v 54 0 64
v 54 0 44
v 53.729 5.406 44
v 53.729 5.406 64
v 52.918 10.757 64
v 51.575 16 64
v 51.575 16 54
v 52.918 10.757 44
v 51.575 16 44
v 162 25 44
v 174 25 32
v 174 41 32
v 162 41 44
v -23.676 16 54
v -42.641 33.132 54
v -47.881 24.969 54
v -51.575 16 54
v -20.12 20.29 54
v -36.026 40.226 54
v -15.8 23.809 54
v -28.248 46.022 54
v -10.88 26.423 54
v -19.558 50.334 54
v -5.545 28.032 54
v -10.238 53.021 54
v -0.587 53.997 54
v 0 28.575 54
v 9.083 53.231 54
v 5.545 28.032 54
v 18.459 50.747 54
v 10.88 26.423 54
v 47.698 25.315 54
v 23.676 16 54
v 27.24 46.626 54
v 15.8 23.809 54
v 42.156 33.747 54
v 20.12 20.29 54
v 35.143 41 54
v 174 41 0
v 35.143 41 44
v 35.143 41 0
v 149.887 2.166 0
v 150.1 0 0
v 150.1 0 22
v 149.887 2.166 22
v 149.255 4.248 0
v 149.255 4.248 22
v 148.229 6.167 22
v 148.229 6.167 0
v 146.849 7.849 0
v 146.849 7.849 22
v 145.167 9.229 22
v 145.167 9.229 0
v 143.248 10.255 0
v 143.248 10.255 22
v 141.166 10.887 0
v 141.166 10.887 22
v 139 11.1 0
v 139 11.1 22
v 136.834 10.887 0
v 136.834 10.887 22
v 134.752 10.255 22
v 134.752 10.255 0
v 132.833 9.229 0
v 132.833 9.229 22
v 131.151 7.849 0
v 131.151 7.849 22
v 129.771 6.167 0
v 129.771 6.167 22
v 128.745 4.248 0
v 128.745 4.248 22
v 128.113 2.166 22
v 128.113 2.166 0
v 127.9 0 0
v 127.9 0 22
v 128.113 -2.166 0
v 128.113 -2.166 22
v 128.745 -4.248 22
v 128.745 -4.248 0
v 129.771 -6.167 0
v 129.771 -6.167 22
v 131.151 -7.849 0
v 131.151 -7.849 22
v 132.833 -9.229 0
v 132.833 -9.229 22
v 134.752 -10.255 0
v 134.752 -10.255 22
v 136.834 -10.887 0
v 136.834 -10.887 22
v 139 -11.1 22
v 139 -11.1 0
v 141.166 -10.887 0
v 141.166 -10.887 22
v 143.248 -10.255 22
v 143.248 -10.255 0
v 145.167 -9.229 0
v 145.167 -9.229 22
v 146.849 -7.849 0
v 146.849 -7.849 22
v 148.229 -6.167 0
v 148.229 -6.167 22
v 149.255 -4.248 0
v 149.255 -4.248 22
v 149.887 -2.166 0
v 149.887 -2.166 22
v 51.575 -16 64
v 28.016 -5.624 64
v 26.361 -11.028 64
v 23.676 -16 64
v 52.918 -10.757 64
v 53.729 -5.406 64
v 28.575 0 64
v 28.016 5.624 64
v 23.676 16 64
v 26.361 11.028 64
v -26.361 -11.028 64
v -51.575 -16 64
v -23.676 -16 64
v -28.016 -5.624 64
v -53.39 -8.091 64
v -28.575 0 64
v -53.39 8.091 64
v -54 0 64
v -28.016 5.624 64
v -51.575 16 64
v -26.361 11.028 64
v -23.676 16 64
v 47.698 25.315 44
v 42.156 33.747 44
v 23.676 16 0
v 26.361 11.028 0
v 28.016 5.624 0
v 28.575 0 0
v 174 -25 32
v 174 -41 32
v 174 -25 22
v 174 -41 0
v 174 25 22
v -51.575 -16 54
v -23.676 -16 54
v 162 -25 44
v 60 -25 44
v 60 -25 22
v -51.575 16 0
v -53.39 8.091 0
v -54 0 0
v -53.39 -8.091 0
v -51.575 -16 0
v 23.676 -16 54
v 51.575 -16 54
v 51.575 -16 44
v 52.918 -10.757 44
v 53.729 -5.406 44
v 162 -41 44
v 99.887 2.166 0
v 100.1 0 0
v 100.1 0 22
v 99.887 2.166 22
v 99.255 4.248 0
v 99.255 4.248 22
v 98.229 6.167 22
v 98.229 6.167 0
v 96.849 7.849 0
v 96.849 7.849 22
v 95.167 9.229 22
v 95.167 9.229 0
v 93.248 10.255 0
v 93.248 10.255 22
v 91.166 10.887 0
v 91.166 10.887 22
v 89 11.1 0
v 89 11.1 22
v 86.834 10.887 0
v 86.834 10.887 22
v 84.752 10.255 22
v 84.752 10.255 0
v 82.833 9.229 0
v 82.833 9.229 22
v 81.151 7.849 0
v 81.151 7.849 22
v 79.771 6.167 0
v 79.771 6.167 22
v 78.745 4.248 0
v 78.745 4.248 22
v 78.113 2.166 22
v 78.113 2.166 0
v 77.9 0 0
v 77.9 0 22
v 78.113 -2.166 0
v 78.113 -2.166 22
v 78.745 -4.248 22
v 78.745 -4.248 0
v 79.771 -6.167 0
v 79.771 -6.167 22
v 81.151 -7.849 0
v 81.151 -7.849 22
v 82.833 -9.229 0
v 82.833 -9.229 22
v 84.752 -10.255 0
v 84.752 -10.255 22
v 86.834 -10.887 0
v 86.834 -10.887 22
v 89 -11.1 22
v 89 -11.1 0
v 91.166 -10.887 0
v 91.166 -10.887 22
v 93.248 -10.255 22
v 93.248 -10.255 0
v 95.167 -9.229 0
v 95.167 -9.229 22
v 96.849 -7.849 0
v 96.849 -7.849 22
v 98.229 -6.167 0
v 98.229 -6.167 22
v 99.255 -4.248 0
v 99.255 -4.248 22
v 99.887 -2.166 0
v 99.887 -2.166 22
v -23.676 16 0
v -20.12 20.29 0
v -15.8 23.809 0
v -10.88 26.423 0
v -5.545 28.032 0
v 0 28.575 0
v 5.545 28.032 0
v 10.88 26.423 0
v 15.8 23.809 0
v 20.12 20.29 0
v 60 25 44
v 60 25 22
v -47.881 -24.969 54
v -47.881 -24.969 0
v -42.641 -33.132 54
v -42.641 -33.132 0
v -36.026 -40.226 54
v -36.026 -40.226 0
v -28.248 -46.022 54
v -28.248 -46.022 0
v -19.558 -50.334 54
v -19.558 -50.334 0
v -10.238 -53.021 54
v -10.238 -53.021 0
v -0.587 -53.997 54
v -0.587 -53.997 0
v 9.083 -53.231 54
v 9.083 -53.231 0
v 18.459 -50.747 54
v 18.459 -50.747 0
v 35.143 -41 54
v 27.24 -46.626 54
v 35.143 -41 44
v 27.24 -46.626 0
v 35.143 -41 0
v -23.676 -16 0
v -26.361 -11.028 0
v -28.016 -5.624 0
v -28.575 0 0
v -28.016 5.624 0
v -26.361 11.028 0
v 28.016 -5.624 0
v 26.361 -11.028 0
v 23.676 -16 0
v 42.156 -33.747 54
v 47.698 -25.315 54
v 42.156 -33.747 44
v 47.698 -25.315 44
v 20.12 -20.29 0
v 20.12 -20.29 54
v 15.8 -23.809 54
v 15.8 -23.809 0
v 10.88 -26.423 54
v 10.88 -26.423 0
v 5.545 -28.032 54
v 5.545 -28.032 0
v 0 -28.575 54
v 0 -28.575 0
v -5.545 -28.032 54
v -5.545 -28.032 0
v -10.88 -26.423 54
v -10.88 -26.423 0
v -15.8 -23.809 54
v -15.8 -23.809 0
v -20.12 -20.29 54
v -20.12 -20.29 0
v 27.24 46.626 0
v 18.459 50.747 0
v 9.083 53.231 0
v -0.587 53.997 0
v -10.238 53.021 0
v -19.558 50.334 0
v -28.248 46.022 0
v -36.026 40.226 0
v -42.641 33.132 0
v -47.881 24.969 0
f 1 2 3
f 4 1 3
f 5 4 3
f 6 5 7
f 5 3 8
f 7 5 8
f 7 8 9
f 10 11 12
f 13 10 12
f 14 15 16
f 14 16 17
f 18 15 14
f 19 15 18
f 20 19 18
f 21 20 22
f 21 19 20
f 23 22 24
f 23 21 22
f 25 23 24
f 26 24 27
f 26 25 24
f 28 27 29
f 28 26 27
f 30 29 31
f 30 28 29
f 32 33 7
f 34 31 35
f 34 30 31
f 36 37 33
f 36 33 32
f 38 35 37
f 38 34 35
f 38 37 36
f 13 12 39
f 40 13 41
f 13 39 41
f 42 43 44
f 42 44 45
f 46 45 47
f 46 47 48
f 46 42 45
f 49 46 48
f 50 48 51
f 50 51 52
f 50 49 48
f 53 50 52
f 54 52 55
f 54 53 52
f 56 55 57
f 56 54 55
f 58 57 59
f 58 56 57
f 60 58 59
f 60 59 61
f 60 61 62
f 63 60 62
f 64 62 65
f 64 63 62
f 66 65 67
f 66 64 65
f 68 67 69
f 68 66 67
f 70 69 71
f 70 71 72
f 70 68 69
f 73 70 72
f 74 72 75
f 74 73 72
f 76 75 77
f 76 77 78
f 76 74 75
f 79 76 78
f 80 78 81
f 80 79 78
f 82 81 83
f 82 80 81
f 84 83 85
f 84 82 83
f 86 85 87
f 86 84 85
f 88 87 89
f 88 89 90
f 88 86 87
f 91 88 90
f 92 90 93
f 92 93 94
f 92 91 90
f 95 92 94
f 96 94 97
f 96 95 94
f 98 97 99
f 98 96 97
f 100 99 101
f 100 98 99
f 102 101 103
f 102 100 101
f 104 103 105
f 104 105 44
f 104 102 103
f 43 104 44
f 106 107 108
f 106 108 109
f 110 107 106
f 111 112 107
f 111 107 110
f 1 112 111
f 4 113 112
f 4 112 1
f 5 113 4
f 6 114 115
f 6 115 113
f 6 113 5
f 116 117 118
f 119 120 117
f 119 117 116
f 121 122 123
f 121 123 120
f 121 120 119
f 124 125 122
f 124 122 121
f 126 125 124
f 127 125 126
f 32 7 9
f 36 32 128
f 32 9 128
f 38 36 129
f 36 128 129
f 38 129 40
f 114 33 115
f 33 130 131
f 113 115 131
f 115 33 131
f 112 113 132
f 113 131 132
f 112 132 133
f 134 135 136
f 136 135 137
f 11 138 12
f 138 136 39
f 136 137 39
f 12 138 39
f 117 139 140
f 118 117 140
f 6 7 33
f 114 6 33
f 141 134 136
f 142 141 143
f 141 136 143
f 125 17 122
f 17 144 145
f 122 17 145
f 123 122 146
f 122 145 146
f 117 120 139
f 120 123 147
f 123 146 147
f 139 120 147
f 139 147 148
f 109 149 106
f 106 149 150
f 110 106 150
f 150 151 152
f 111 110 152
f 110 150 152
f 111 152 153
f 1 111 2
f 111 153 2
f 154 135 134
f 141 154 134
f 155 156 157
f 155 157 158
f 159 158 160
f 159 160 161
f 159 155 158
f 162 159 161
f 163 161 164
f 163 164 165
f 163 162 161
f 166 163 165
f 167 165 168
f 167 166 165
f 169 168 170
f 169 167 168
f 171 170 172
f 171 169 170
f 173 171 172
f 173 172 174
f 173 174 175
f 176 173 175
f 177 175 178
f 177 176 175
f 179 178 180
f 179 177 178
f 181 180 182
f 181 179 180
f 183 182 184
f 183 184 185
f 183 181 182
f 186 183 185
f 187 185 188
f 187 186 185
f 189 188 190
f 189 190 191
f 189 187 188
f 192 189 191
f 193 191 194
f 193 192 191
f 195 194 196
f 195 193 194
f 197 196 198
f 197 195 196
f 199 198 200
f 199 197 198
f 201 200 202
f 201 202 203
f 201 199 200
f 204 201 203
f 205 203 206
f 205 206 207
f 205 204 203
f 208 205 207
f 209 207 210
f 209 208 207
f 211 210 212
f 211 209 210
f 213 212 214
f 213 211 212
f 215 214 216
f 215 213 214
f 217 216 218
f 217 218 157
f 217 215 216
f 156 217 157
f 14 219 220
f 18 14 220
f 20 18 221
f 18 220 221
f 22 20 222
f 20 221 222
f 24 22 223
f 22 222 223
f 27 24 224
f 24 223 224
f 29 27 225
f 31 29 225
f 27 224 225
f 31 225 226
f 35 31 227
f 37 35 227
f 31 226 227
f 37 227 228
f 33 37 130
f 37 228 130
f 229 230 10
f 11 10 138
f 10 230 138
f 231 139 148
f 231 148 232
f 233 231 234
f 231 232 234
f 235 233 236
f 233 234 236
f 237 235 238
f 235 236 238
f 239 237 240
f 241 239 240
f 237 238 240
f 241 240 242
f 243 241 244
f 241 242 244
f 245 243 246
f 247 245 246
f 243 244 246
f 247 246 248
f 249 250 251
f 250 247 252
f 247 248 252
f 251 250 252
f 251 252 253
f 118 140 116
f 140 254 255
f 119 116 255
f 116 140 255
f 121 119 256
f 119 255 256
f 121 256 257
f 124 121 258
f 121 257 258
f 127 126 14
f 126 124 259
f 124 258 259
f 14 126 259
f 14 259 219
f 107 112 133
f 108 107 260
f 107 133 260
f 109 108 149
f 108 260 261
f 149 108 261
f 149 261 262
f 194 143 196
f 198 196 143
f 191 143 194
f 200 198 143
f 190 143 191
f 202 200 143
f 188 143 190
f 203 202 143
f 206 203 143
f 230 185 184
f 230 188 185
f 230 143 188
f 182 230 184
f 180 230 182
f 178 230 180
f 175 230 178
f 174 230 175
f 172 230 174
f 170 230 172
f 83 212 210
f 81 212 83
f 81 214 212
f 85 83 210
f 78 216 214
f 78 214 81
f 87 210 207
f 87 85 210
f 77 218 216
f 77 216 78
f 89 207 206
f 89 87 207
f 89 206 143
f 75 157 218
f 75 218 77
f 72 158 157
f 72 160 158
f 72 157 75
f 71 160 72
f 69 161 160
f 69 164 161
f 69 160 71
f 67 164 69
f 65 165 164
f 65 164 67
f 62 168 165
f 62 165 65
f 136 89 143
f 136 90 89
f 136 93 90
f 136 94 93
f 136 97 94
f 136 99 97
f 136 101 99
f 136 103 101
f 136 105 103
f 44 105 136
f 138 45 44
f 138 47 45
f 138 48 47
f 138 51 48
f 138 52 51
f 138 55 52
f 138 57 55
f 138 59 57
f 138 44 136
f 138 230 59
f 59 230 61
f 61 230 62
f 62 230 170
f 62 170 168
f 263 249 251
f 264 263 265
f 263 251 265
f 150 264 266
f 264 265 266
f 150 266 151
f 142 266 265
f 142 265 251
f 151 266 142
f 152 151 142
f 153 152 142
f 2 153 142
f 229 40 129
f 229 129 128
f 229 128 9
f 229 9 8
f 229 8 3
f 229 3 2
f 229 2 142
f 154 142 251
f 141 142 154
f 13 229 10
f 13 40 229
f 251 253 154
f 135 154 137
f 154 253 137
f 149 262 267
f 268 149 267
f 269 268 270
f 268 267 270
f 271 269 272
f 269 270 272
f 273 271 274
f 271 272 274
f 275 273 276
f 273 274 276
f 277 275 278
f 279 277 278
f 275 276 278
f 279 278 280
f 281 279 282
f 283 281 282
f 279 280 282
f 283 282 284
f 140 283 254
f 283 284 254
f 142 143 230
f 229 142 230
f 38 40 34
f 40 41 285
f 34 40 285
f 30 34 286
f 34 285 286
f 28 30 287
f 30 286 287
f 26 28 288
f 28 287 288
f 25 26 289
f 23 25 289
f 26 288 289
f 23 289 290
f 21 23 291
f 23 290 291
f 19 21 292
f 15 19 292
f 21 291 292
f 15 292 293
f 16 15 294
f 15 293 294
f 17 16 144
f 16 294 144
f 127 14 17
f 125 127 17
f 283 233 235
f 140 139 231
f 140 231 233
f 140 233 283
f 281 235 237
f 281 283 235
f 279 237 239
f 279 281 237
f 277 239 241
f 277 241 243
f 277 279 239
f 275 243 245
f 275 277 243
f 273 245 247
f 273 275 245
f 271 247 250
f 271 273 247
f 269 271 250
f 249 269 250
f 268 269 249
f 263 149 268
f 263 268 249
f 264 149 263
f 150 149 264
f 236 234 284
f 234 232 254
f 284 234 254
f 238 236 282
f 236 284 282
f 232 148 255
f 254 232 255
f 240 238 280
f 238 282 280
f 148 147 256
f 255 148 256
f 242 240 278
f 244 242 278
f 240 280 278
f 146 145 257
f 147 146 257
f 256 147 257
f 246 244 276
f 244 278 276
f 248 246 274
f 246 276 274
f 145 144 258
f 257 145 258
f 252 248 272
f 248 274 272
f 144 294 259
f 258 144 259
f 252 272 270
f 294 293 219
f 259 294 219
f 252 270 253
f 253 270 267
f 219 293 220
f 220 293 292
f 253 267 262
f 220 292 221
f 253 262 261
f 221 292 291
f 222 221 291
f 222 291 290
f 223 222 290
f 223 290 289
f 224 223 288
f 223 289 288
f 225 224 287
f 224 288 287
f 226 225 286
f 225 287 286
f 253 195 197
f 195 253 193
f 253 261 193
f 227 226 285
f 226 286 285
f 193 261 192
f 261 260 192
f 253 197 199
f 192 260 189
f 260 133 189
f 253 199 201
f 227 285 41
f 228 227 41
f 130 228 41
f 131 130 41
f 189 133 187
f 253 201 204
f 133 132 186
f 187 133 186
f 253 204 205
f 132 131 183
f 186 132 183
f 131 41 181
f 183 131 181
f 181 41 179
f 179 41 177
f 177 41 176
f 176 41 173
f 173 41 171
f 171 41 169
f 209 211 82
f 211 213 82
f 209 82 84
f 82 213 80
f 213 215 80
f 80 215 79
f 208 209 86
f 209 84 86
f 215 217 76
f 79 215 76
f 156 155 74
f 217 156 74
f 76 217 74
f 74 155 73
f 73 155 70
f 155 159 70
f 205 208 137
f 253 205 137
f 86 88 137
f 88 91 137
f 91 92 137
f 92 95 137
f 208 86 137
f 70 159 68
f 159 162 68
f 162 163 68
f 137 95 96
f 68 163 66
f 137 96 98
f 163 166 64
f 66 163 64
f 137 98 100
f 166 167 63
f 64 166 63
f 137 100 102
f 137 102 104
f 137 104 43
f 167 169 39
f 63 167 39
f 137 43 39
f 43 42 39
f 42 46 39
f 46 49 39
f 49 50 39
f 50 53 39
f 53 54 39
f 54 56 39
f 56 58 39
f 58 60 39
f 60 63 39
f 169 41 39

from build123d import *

# Parameters (mm, degrees)
F1_DEPTH = 54
F2_DEPTH = 64
F3_DEPTH = 44
F0_W     = 114
F0_H     = 50
F0_R     = 11.1
F4_DEPTH = 22
F5_SIZE2 = 12
F5_SIZE  = 12


with BuildPart() as f1:
    # F0 (on Top) → F1 (new body)
    with BuildSketch(Plane.XY):
        with BuildLine():
            Line((23.675528, 16), (51.575188, 16))
            ThreePointArc((51.575188, 16), (45.124741, 29.660711), (35.142567, 41))
            ThreePointArc((35.142567, 41), (-14.958535, 51.886821), (-51.575188, 16))
            Line((-51.575188, 16), (-23.675528, 16))
            ThreePointArc((-23.675528, 16), (0, 28.575), (23.675528, 16))
        make_face()
        with BuildLine():
            ThreePointArc((35.142567, -41), (45.124741, -29.660711), (51.575188, -16))
            Line((51.575188, -16), (23.675528, -16))
            ThreePointArc((23.675528, -16), (0, -28.575), (-23.675528, -16))
            Line((-23.675528, -16), (-51.575188, -16))
            ThreePointArc((-51.575188, -16), (-14.958535, -51.886821), (35.142567, -41))
        make_face()
    extrude(amount=F1_DEPTH)



with BuildPart() as f2:
    # F0 (on Top) → F2 (new body)
    with BuildSketch(Plane.XY):
        with BuildLine():
            Line((-23.675528, 16), (-51.575188, 16))
            ThreePointArc((-51.575188, 16), (-54, 0), (-51.575188, -16))
            Line((-51.575188, -16), (-23.675528, -16))
            ThreePointArc((-23.675528, -16), (-28.575, 0), (-23.675528, 16))
        make_face()
        with BuildLine():
            ThreePointArc((51.575188, -16), (53.390356, -8.091349), (54, 0))
            ThreePointArc((54, 0), (53.390356, 8.091349), (51.575188, 16))
            Line((51.575188, 16), (23.675528, 16))
            ThreePointArc((23.675528, 16), (27.322691, 8.366672), (28.575, 0))
            ThreePointArc((28.575, 0), (27.322691, -8.366672), (23.675528, -16))
            Line((23.675528, -16), (51.575188, -16))
        make_face()
    extrude(amount=F2_DEPTH)


with BuildPart() as f1_1:
    add(f1.part)

    add(f2.part)  # F3 merges F2
    # F0 (on Top) → F3 (join)
    with BuildSketch(Plane.XY):
        with BuildLine():
            ThreePointArc((51.575188, 16), (53.390356, 8.091349), (54, 0))
            ThreePointArc((54, 0), (53.390356, -8.091349), (51.575188, -16))
            ThreePointArc((51.575188, -16), (45.124741, -29.660711), (35.142567, -41))
            Line((35.142567, -41), (174, -41))
            Line((174, -41), (174, -25))
            Line((174, -25), (60, -25))
            Line((60, -25), (60, 25))
            Line((60, 25), (174, 25))
            Line((174, 25), (174, 41))
            Line((174, 41), (35.142567, 41))
            ThreePointArc((35.142567, 41), (45.124741, 29.660711), (51.575188, 16))
        make_face()
    extrude(amount=F3_DEPTH)

    # F0 (on Top) → F4 (join)
    with BuildSketch(Plane.XY):
        with Locations((117, 0)):
            Rectangle(F0_W, F0_H)
        with Locations((89, 0)):
            Circle(F0_R, mode=Mode.SUBTRACT)
        with Locations((139, 0)):
            Circle(F0_R, mode=Mode.SUBTRACT)
    extrude(amount=F4_DEPTH)

    # F5
    f5_edges = [f1_1.edges().sort_by_distance(p)[0] for p in [
        (174, -33, 44),
        (174, 33, 44),
    ]]
    chamfer(f5_edges, length=F5_SIZE, length2=F5_SIZE2)


solid = f1_1.part
